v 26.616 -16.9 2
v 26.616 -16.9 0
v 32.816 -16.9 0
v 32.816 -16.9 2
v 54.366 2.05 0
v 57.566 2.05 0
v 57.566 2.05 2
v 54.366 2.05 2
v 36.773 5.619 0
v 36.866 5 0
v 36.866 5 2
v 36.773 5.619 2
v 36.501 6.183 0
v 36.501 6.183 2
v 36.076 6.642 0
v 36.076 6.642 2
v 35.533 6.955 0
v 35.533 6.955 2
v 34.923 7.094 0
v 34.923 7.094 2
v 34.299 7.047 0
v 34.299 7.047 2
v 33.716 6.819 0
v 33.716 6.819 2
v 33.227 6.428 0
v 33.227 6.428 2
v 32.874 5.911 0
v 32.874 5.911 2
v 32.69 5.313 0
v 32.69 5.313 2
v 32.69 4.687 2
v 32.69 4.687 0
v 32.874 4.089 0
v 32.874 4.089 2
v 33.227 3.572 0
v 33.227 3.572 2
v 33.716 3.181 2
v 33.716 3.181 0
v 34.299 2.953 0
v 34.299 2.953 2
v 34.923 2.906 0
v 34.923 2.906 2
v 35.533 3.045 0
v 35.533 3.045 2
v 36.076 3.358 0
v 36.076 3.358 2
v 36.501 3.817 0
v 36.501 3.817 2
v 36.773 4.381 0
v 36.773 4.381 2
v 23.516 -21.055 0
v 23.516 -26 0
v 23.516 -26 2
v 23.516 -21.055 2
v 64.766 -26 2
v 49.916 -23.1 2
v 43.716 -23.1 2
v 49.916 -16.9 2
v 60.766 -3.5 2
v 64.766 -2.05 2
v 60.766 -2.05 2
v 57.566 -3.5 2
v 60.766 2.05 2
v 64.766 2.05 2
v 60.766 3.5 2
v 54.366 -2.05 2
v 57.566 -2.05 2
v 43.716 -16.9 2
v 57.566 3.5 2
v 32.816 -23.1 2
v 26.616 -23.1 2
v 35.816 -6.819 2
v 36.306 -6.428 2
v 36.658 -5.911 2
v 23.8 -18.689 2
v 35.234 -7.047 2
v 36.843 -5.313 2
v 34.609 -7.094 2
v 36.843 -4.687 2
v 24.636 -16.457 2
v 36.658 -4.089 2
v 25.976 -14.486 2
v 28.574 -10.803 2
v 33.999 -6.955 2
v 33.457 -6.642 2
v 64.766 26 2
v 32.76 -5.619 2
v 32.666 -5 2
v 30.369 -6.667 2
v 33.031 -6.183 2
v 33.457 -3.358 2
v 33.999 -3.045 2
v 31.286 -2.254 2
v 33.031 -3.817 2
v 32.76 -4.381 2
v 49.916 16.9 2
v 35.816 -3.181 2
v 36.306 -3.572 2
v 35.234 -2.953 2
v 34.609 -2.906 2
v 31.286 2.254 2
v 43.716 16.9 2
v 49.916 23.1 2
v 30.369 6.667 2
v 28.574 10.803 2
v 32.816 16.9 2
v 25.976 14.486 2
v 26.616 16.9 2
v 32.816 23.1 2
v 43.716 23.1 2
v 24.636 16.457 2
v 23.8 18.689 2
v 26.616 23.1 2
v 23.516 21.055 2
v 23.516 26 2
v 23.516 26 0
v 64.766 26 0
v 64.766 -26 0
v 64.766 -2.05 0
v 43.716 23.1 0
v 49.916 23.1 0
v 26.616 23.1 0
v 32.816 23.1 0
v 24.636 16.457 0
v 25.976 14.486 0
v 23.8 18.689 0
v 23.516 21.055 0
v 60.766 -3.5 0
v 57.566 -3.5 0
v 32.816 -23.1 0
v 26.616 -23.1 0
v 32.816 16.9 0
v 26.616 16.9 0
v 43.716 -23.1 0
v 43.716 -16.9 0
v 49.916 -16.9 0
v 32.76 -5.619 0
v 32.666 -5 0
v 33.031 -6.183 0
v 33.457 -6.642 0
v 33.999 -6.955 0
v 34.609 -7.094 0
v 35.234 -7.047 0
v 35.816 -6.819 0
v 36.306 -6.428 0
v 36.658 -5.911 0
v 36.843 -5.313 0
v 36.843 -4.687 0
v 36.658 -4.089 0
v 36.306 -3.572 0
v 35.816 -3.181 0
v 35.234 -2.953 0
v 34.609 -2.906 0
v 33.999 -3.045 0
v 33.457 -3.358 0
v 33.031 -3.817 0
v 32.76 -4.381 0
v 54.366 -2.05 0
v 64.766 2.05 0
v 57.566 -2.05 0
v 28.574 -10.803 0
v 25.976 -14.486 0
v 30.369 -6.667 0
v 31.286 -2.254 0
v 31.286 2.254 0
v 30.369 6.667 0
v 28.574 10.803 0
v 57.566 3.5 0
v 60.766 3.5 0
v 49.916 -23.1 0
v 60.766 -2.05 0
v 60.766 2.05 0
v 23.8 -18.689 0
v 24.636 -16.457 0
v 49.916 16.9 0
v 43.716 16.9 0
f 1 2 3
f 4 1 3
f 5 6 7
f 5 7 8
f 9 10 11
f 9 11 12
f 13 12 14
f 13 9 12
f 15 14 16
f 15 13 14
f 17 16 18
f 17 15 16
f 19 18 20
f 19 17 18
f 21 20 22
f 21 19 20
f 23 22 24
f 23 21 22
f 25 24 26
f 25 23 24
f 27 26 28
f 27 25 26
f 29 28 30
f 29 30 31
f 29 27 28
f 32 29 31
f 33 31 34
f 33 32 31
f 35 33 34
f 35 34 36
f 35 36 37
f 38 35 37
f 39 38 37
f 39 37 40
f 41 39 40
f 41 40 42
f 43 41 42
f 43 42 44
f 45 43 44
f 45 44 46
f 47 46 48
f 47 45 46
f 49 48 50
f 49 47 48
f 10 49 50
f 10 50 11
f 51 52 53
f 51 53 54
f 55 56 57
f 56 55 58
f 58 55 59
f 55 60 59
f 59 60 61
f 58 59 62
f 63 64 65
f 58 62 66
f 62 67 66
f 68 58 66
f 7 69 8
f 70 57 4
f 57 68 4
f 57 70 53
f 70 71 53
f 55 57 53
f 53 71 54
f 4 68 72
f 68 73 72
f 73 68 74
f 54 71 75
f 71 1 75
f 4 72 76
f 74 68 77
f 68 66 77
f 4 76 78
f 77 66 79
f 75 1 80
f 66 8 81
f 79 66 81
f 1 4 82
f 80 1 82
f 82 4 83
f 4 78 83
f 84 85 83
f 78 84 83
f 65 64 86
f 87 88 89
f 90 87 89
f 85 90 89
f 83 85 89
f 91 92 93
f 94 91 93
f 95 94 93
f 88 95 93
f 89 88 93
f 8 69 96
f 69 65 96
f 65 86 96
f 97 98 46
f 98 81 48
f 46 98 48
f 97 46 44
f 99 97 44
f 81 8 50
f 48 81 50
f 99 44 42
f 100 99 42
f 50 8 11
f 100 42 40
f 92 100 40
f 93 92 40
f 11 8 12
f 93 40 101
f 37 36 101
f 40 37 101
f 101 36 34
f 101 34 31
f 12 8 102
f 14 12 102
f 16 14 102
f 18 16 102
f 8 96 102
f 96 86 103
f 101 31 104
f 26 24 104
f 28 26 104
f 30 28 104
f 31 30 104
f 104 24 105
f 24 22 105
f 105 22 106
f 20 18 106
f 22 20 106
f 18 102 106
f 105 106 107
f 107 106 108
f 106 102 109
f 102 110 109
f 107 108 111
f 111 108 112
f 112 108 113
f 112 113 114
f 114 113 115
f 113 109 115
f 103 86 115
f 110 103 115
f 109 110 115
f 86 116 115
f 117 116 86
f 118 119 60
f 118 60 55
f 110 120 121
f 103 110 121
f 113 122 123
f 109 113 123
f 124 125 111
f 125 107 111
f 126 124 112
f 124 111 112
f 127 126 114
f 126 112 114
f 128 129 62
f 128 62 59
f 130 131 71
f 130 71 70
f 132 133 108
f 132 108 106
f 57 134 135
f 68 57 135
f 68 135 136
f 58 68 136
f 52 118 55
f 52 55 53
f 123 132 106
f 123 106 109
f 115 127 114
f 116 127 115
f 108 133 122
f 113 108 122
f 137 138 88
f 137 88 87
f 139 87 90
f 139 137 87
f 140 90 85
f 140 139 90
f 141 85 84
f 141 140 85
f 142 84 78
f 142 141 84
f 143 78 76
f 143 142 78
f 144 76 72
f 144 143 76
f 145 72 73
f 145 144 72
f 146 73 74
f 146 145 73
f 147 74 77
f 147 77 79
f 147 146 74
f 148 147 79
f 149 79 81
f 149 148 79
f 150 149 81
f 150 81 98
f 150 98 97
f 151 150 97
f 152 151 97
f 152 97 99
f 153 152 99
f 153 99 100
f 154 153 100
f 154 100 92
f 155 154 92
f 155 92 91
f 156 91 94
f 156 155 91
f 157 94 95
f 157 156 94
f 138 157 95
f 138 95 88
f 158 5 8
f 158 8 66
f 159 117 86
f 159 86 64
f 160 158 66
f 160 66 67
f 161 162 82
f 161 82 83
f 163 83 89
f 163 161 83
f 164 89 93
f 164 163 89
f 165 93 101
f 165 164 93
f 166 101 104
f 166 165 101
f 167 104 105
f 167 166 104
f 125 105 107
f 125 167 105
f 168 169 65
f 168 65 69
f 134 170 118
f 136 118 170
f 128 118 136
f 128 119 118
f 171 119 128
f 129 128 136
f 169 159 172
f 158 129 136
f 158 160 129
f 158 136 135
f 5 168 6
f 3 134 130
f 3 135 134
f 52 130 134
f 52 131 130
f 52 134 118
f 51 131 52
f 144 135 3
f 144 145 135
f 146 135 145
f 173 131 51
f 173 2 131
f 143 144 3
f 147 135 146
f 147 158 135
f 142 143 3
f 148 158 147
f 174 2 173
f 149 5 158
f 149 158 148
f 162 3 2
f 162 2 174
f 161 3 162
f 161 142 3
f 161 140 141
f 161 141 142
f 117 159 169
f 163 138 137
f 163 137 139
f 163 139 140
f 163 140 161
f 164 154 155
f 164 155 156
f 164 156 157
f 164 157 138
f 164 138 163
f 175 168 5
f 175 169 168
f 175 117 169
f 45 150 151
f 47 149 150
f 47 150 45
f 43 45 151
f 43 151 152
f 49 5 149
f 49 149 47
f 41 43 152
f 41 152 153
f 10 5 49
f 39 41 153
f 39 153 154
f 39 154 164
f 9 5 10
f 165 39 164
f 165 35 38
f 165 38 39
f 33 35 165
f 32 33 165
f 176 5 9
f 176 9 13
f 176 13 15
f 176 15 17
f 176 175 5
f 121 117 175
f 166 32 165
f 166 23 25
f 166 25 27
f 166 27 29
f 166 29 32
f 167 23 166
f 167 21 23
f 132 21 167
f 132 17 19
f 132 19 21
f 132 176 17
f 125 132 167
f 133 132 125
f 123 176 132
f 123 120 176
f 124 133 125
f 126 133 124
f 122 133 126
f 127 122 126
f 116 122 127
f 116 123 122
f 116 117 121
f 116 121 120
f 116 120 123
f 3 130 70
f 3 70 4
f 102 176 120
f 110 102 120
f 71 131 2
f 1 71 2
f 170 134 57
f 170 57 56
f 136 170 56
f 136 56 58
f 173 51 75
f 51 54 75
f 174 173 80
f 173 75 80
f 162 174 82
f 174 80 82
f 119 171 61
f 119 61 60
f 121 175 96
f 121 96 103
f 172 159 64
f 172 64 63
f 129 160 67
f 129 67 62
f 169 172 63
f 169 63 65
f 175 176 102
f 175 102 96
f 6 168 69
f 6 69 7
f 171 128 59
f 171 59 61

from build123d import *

# Parameters (mm, degrees)
SKETCH_1_R      = 2.1
SKETCH_1_W      = 6.2
SKETCH_1_H      = 6.2
EXTRUDE_1_DEPTH = 2
FILLET_1_R      = 10


with BuildPart() as part:
    # 草图1 → 凸台-拉伸1 (new body)
    with BuildSketch(Plane.XY):
        with BuildLine():
            Line((64.766222961, -26), (23.516222961, -26))
            Line((23.516222961, -26), (23.516222961, -16.9))
            ThreePointArc((23.516222961, -16.9), (31.401260639, 0), (23.516222961, 16.9))
            Line((23.516222961, 16.9), (23.516222961, 26))
            Line((23.516222961, 26), (64.766222961, 26))
            Line((64.766222961, 26), (64.766222961, 2.05))
            Line((64.766222961, 2.05), (60.766222961, 2.05))
            Line((60.766222961, 2.05), (60.766222961, 3.5))
            Line((60.766222961, 3.5), (57.566222961, 3.5))
            Line((57.566222961, 3.5), (57.566222961, 2.05))
            Line((57.566222961, 2.05), (54.366222961, 2.05))
            Line((54.366222961, 2.05), (54.366222961, -2.05))
            Line((54.366222961, -2.05), (57.566222961, -2.05))
            Line((57.566222961, -2.05), (57.566222961, -3.5))
            Line((57.566222961, -3.5), (60.766222961, -3.5))
            Line((60.766222961, -3.5), (60.766222961, -2.05))
            Line((60.766222961, -2.05), (64.766222961, -2.05))
            Line((64.766222961, -2.05), (64.766222961, -26))
        make_face()
        with Locations((34.766222961, 5)):
            Circle(SKETCH_1_R, mode=Mode.SUBTRACT)
        with Locations(Location((34.766222961, -5, 0), (0, 0, 180))):
            Circle(SKETCH_1_R, mode=Mode.SUBTRACT)
        with Locations((46.816222961, -20)):
            Rectangle(SKETCH_1_W, SKETCH_1_H, mode=Mode.SUBTRACT)
        with Locations((29.716222961, -20)):
            Rectangle(SKETCH_1_W, SKETCH_1_H, mode=Mode.SUBTRACT)
        with Locations((29.716222961, 20)):
            Rectangle(SKETCH_1_W, SKETCH_1_H, mode=Mode.SUBTRACT)
        with Locations((46.816222961, 20)):
            Rectangle(SKETCH_1_W, SKETCH_1_H, mode=Mode.SUBTRACT)
    extrude(amount=EXTRUDE_1_DEPTH)

    # 圆角1
    fillet_1_edges = [part.edges().sort_by_distance(p)[0] for p in [
        (23.516222961, -16.9, 1),
        (23.516222961, 16.9, 1),
    ]]
    fillet(fillet_1_edges, radius=FILLET_1_R)


solid = part.part
